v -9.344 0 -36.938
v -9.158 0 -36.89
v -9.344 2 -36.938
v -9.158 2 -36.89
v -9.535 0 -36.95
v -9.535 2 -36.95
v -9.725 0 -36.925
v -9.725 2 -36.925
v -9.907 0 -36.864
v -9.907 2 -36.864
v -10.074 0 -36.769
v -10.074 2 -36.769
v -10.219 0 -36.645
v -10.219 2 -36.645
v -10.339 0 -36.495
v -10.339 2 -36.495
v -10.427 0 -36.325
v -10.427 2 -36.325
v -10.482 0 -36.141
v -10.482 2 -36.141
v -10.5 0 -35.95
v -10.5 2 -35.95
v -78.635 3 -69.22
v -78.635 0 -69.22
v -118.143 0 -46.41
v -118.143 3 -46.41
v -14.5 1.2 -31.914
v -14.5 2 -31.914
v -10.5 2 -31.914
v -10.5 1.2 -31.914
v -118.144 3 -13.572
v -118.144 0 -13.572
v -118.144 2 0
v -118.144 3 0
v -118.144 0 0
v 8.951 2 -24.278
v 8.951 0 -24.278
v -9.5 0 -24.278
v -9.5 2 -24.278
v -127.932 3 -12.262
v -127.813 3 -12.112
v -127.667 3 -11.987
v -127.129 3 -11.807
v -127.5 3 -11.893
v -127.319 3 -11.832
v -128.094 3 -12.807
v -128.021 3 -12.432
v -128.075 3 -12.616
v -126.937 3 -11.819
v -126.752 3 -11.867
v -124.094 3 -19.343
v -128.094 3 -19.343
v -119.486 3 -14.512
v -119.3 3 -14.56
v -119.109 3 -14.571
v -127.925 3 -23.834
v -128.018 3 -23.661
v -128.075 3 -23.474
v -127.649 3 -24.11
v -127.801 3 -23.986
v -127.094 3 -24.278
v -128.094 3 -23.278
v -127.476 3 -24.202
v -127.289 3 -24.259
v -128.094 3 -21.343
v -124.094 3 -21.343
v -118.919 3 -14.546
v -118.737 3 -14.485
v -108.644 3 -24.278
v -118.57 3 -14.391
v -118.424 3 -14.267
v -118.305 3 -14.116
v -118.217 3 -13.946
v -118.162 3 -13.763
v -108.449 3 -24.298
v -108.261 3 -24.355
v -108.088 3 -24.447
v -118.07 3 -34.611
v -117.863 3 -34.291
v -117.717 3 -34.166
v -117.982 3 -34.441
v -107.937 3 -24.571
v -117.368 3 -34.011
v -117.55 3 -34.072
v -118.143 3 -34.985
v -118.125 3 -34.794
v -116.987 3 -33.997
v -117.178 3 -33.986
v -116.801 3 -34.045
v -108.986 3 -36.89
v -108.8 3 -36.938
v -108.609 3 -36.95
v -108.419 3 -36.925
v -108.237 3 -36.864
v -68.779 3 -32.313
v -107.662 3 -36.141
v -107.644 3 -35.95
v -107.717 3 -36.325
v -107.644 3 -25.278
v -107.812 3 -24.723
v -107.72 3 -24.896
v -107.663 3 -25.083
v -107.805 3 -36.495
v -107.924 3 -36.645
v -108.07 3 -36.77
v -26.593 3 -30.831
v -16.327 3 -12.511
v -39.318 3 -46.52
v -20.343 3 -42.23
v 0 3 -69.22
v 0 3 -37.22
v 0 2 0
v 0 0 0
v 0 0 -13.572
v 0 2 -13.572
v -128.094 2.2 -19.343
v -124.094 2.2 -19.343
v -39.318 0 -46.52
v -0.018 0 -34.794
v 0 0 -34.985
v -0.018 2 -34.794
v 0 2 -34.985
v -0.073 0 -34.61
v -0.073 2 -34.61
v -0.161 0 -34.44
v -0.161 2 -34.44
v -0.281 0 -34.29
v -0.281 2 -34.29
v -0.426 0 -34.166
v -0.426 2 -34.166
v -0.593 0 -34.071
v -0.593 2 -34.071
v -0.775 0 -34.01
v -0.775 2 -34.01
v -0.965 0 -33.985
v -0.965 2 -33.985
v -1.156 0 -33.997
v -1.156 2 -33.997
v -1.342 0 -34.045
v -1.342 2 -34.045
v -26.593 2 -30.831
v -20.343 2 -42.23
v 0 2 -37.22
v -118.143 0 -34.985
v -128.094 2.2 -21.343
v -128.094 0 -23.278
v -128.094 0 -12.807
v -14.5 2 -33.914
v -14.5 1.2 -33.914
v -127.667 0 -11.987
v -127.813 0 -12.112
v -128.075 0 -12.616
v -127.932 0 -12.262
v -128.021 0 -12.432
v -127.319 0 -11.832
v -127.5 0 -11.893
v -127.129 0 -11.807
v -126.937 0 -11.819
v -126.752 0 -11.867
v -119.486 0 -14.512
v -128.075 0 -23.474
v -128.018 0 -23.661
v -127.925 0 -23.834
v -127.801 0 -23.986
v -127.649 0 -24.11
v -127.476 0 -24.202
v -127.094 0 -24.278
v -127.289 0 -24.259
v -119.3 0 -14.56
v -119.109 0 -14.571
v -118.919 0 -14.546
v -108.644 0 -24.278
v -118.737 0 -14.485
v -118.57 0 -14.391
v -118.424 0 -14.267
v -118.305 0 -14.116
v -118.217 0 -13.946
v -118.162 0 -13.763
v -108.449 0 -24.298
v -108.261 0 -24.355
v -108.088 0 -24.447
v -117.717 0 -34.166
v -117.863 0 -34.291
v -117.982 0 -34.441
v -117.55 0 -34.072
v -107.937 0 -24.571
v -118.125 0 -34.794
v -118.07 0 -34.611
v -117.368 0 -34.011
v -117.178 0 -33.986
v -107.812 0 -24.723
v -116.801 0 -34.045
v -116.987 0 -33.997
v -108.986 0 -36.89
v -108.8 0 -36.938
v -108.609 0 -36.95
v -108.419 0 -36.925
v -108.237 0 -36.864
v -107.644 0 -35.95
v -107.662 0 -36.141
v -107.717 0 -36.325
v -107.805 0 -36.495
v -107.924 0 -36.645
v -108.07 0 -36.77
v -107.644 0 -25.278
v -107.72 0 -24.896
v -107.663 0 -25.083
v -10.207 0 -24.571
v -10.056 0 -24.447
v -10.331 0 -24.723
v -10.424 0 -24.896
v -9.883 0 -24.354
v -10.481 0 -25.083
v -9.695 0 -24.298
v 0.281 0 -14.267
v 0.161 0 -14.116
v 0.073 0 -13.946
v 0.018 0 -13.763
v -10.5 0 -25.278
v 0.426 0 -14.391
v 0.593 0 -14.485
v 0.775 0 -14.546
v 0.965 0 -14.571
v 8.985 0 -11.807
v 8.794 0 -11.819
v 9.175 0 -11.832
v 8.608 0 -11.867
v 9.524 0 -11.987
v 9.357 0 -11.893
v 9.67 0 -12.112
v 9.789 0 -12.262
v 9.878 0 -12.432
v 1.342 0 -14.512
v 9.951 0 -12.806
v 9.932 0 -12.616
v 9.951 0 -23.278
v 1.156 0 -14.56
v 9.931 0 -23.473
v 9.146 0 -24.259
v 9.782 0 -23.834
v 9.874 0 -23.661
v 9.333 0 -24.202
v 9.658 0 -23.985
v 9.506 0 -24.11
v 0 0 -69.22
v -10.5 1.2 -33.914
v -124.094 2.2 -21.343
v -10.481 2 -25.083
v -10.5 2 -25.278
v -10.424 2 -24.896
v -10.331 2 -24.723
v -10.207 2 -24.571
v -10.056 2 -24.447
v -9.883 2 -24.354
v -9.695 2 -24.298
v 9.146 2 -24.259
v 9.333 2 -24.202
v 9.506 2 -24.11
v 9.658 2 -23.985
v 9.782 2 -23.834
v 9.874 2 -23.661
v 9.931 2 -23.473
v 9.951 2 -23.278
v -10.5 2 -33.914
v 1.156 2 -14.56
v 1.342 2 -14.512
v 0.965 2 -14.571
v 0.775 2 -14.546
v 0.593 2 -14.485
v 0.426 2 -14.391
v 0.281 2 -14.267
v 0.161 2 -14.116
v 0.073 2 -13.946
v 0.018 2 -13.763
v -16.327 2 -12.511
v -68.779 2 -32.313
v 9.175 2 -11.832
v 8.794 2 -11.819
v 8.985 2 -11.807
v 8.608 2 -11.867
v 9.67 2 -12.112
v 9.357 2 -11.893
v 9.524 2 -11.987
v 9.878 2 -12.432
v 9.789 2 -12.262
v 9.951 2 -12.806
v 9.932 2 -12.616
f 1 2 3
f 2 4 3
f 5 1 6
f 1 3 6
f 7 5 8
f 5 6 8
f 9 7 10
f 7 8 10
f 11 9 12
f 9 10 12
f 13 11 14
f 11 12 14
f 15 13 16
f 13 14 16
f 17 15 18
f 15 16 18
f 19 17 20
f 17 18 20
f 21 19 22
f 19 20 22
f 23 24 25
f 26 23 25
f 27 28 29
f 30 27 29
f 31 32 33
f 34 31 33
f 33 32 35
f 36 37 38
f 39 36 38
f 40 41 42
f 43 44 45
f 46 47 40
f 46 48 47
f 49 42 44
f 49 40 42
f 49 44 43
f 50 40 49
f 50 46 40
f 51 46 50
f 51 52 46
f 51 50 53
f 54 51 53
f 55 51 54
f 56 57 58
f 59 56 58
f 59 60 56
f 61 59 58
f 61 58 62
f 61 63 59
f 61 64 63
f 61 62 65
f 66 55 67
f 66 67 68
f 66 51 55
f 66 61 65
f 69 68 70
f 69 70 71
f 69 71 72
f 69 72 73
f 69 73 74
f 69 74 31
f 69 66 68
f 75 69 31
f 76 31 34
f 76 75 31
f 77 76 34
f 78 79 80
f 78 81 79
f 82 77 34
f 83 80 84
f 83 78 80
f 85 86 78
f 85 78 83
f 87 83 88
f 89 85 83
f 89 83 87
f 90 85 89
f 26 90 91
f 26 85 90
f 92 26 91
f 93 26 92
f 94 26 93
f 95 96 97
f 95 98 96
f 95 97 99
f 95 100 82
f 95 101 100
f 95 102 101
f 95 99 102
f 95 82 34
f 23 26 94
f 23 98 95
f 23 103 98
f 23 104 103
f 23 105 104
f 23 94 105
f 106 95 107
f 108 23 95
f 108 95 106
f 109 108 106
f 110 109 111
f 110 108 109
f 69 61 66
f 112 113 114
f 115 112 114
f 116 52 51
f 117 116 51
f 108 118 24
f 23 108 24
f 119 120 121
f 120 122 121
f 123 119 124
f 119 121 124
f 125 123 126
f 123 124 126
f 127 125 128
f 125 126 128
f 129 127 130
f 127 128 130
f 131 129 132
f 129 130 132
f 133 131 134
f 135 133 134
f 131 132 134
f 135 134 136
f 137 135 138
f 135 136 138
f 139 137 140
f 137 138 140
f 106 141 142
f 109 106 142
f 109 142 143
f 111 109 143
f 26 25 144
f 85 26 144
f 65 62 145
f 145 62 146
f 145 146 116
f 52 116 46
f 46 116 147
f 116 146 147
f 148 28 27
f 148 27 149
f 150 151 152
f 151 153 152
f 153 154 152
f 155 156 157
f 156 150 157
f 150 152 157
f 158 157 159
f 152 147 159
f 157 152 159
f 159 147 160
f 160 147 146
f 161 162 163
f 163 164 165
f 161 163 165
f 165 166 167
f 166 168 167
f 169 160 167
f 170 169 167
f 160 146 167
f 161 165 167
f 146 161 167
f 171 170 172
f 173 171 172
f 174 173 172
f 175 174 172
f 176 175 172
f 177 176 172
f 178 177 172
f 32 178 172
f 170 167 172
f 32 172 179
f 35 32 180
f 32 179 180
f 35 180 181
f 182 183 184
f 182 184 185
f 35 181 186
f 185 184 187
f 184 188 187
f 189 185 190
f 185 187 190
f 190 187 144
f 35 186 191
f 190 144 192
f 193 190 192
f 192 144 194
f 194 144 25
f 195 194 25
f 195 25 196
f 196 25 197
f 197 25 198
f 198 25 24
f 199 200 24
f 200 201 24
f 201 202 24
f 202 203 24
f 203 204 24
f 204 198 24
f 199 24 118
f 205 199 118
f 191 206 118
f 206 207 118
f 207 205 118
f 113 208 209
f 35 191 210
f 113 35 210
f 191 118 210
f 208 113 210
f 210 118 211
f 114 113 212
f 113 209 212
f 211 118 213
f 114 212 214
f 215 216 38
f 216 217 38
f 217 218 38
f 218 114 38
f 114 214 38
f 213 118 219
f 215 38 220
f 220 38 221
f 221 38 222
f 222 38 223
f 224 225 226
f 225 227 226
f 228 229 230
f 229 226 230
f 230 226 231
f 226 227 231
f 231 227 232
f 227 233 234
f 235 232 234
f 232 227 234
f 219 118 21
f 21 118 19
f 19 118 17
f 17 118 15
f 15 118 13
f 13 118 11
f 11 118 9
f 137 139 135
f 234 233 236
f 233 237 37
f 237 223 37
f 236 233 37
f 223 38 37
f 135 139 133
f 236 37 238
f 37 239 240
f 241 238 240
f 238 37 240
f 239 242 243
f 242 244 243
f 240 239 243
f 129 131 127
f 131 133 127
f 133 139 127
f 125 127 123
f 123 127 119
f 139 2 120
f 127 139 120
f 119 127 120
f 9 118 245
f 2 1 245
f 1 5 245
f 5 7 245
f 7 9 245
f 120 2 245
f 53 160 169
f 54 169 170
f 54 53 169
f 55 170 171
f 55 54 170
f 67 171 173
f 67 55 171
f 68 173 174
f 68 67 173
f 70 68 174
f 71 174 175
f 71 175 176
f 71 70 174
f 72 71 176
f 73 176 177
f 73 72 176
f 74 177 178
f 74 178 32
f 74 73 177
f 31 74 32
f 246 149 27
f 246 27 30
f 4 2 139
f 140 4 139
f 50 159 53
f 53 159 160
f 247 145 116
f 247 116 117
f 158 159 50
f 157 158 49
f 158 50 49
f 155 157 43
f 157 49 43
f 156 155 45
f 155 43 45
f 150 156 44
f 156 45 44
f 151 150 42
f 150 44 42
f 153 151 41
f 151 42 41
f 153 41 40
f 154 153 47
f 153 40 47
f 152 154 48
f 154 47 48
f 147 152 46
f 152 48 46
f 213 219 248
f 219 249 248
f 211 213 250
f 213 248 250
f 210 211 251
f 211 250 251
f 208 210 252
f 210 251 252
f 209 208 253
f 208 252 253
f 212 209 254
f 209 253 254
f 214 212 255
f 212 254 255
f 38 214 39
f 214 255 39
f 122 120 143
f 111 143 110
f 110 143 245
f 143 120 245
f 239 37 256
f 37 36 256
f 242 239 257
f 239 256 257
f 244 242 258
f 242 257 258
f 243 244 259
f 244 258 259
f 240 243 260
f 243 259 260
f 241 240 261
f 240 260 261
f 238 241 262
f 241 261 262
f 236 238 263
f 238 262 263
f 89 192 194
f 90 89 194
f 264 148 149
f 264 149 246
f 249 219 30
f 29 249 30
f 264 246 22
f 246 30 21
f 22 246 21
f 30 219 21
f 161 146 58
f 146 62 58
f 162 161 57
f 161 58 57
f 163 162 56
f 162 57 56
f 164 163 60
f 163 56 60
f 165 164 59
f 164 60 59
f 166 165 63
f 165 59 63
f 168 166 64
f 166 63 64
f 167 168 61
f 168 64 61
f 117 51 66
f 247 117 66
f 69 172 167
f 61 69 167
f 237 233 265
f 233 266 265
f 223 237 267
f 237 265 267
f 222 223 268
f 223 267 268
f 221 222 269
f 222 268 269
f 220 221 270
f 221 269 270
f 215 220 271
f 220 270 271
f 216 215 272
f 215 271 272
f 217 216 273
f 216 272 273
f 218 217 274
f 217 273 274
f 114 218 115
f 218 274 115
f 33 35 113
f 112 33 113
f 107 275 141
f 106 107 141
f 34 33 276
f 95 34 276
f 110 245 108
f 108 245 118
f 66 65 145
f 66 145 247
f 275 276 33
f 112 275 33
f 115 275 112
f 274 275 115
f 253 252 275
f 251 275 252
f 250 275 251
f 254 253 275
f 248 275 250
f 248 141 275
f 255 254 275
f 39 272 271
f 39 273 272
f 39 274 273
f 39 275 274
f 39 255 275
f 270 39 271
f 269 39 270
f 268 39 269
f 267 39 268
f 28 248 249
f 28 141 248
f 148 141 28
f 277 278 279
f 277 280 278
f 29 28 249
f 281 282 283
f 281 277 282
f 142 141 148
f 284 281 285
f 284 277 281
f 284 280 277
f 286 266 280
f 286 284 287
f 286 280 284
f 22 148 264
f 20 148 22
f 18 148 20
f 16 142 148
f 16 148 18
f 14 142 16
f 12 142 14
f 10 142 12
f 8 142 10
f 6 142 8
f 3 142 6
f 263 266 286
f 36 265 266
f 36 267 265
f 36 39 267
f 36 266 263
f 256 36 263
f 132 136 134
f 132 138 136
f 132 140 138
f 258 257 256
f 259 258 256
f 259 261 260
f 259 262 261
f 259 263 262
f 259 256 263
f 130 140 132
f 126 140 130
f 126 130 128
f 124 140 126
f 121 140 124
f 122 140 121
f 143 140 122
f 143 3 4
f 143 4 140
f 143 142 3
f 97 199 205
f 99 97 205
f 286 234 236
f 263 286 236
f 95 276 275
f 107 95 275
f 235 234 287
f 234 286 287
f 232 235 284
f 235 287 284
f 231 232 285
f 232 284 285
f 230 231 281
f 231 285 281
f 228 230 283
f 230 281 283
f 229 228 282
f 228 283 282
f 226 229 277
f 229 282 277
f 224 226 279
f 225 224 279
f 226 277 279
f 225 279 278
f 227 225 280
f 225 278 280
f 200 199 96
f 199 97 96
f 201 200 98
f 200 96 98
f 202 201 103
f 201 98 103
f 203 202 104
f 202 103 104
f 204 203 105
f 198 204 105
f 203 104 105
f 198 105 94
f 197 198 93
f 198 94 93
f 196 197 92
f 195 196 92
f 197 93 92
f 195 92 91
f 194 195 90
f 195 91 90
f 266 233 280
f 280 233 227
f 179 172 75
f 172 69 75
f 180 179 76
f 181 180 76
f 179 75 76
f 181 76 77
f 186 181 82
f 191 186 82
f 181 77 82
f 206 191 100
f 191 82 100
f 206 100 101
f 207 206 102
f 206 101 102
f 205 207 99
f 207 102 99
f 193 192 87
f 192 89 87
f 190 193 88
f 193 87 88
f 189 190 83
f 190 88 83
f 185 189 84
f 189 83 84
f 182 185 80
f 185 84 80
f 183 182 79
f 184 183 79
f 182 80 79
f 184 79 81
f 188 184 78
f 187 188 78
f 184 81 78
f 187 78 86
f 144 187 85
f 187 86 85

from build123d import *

# Parameters (mm, degrees)
P_IDAT_VYSUNUT_M1_DEPTH  = 3
P_IDAT_VYSUNUT_M2_DEPTH  = 2
ZAOBLIT4_R               = 1
SKICA2_W                 = 4
SKICA2_H                 = 2
ODEBRAT_VYSUNUT_M2_DEPTH = 0.8
SKICA3_W                 = 4
SKICA3_H                 = 2
ODEBRAT_VYSUNUT_M3_DEPTH = 0.8


with BuildPart() as part:
    # Skica1 → P_idat vysunut_m1 (new body)
    with BuildSketch(Plane(origin=(0, 0, 0), x_dir=(1, 0, 0), z_dir=(0, 1, 0))):
        Polygon((-118.143750166, 15), (-118.143750166, 0), (-68.779346971, 32.313398106), (-16.32734533, 12.51119421), (-26.593132493, 30.830954414), (-20.343228113, 42.230019956), (0, 37.22), (0, 69.22), (-39.317553332, 46.52), (-78.635106664, 69.22), (-118.143185584, 46.41), (-118.143185584, 33.5570142), (-107.643750166, 37.378496169), (-107.643750166, 24.278496169), (-128.093750166, 24.278496169), (-128.093750166, 11.378496169), align=None)
    extrude(amount=P_IDAT_VYSUNUT_M1_DEPTH)

    # Skica1_5 → P_idat vysunut_m2 (add)
    with BuildSketch(Plane(origin=(0, 0, 0), x_dir=(1, 0, 0), z_dir=(0, 1, 0))):
        Polygon((-68.779346971, 32.313398106), (-118.143750166, 0), (0, 0), (0, 15), (9.950504516, 11.37831254), (9.950504516, 24.27831254), (-10.5, 24.27831254), (-10.5, 37.37831254), (0, 33.55662508), (0, 37.22), (-20.343228113, 42.230019956), (-26.593132493, 30.830954414), (-16.32734533, 12.51119421), align=None)
    extrude(amount=P_IDAT_VYSUNUT_M2_DEPTH)

    # Zaoblit4
    zaoblit4_edges = [part.edges().sort_by_distance(p)[0] for p in [
        (-118.143750166, 1.5, -15),
        (-128.093750166, 1.5, -11.378496169),
        (-128.093750166, 1.5, -24.278496169),
        (-107.643750166, 1.5, -24.278496169),
        (-107.643750166, 1.5, -37.378496169),
        (-118.143185584, 1.5, -33.5570142),
        (-10.5, 1, -24.27831254),
        (-10.5, 1, -37.37831254),
        (0, 1, -33.55662508),
        (0, 1, -15),
        (9.950504516, 1, -11.37831254),
        (9.950504516, 1, -24.27831254),
    ]]
    fillet(zaoblit4_edges, radius=ZAOBLIT4_R)

    # Skica2 → Odebrat vysunut_m2 (cut)
    with BuildSketch(Plane(origin=(0, 3, 0), x_dir=(1, 0, 0), z_dir=(0, 1, 0))):
        with Locations((-126.093750166, 20.342570172)):
            Rectangle(SKICA2_W, SKICA2_H)
    extrude(amount=-ODEBRAT_VYSUNUT_M2_DEPTH, mode=Mode.SUBTRACT)

    # Skica3 → Odebrat vysunut_m3 (cut)
    with BuildSketch(Plane(origin=(0, 2, 0), x_dir=(1, 0, 0), z_dir=(0, 1, 0))):
        with Locations((-12.5, 32.914238537)):
            Rectangle(SKICA3_W, SKICA3_H)
    extrude(amount=-ODEBRAT_VYSUNUT_M3_DEPTH, mode=Mode.SUBTRACT)


solid = part.part
